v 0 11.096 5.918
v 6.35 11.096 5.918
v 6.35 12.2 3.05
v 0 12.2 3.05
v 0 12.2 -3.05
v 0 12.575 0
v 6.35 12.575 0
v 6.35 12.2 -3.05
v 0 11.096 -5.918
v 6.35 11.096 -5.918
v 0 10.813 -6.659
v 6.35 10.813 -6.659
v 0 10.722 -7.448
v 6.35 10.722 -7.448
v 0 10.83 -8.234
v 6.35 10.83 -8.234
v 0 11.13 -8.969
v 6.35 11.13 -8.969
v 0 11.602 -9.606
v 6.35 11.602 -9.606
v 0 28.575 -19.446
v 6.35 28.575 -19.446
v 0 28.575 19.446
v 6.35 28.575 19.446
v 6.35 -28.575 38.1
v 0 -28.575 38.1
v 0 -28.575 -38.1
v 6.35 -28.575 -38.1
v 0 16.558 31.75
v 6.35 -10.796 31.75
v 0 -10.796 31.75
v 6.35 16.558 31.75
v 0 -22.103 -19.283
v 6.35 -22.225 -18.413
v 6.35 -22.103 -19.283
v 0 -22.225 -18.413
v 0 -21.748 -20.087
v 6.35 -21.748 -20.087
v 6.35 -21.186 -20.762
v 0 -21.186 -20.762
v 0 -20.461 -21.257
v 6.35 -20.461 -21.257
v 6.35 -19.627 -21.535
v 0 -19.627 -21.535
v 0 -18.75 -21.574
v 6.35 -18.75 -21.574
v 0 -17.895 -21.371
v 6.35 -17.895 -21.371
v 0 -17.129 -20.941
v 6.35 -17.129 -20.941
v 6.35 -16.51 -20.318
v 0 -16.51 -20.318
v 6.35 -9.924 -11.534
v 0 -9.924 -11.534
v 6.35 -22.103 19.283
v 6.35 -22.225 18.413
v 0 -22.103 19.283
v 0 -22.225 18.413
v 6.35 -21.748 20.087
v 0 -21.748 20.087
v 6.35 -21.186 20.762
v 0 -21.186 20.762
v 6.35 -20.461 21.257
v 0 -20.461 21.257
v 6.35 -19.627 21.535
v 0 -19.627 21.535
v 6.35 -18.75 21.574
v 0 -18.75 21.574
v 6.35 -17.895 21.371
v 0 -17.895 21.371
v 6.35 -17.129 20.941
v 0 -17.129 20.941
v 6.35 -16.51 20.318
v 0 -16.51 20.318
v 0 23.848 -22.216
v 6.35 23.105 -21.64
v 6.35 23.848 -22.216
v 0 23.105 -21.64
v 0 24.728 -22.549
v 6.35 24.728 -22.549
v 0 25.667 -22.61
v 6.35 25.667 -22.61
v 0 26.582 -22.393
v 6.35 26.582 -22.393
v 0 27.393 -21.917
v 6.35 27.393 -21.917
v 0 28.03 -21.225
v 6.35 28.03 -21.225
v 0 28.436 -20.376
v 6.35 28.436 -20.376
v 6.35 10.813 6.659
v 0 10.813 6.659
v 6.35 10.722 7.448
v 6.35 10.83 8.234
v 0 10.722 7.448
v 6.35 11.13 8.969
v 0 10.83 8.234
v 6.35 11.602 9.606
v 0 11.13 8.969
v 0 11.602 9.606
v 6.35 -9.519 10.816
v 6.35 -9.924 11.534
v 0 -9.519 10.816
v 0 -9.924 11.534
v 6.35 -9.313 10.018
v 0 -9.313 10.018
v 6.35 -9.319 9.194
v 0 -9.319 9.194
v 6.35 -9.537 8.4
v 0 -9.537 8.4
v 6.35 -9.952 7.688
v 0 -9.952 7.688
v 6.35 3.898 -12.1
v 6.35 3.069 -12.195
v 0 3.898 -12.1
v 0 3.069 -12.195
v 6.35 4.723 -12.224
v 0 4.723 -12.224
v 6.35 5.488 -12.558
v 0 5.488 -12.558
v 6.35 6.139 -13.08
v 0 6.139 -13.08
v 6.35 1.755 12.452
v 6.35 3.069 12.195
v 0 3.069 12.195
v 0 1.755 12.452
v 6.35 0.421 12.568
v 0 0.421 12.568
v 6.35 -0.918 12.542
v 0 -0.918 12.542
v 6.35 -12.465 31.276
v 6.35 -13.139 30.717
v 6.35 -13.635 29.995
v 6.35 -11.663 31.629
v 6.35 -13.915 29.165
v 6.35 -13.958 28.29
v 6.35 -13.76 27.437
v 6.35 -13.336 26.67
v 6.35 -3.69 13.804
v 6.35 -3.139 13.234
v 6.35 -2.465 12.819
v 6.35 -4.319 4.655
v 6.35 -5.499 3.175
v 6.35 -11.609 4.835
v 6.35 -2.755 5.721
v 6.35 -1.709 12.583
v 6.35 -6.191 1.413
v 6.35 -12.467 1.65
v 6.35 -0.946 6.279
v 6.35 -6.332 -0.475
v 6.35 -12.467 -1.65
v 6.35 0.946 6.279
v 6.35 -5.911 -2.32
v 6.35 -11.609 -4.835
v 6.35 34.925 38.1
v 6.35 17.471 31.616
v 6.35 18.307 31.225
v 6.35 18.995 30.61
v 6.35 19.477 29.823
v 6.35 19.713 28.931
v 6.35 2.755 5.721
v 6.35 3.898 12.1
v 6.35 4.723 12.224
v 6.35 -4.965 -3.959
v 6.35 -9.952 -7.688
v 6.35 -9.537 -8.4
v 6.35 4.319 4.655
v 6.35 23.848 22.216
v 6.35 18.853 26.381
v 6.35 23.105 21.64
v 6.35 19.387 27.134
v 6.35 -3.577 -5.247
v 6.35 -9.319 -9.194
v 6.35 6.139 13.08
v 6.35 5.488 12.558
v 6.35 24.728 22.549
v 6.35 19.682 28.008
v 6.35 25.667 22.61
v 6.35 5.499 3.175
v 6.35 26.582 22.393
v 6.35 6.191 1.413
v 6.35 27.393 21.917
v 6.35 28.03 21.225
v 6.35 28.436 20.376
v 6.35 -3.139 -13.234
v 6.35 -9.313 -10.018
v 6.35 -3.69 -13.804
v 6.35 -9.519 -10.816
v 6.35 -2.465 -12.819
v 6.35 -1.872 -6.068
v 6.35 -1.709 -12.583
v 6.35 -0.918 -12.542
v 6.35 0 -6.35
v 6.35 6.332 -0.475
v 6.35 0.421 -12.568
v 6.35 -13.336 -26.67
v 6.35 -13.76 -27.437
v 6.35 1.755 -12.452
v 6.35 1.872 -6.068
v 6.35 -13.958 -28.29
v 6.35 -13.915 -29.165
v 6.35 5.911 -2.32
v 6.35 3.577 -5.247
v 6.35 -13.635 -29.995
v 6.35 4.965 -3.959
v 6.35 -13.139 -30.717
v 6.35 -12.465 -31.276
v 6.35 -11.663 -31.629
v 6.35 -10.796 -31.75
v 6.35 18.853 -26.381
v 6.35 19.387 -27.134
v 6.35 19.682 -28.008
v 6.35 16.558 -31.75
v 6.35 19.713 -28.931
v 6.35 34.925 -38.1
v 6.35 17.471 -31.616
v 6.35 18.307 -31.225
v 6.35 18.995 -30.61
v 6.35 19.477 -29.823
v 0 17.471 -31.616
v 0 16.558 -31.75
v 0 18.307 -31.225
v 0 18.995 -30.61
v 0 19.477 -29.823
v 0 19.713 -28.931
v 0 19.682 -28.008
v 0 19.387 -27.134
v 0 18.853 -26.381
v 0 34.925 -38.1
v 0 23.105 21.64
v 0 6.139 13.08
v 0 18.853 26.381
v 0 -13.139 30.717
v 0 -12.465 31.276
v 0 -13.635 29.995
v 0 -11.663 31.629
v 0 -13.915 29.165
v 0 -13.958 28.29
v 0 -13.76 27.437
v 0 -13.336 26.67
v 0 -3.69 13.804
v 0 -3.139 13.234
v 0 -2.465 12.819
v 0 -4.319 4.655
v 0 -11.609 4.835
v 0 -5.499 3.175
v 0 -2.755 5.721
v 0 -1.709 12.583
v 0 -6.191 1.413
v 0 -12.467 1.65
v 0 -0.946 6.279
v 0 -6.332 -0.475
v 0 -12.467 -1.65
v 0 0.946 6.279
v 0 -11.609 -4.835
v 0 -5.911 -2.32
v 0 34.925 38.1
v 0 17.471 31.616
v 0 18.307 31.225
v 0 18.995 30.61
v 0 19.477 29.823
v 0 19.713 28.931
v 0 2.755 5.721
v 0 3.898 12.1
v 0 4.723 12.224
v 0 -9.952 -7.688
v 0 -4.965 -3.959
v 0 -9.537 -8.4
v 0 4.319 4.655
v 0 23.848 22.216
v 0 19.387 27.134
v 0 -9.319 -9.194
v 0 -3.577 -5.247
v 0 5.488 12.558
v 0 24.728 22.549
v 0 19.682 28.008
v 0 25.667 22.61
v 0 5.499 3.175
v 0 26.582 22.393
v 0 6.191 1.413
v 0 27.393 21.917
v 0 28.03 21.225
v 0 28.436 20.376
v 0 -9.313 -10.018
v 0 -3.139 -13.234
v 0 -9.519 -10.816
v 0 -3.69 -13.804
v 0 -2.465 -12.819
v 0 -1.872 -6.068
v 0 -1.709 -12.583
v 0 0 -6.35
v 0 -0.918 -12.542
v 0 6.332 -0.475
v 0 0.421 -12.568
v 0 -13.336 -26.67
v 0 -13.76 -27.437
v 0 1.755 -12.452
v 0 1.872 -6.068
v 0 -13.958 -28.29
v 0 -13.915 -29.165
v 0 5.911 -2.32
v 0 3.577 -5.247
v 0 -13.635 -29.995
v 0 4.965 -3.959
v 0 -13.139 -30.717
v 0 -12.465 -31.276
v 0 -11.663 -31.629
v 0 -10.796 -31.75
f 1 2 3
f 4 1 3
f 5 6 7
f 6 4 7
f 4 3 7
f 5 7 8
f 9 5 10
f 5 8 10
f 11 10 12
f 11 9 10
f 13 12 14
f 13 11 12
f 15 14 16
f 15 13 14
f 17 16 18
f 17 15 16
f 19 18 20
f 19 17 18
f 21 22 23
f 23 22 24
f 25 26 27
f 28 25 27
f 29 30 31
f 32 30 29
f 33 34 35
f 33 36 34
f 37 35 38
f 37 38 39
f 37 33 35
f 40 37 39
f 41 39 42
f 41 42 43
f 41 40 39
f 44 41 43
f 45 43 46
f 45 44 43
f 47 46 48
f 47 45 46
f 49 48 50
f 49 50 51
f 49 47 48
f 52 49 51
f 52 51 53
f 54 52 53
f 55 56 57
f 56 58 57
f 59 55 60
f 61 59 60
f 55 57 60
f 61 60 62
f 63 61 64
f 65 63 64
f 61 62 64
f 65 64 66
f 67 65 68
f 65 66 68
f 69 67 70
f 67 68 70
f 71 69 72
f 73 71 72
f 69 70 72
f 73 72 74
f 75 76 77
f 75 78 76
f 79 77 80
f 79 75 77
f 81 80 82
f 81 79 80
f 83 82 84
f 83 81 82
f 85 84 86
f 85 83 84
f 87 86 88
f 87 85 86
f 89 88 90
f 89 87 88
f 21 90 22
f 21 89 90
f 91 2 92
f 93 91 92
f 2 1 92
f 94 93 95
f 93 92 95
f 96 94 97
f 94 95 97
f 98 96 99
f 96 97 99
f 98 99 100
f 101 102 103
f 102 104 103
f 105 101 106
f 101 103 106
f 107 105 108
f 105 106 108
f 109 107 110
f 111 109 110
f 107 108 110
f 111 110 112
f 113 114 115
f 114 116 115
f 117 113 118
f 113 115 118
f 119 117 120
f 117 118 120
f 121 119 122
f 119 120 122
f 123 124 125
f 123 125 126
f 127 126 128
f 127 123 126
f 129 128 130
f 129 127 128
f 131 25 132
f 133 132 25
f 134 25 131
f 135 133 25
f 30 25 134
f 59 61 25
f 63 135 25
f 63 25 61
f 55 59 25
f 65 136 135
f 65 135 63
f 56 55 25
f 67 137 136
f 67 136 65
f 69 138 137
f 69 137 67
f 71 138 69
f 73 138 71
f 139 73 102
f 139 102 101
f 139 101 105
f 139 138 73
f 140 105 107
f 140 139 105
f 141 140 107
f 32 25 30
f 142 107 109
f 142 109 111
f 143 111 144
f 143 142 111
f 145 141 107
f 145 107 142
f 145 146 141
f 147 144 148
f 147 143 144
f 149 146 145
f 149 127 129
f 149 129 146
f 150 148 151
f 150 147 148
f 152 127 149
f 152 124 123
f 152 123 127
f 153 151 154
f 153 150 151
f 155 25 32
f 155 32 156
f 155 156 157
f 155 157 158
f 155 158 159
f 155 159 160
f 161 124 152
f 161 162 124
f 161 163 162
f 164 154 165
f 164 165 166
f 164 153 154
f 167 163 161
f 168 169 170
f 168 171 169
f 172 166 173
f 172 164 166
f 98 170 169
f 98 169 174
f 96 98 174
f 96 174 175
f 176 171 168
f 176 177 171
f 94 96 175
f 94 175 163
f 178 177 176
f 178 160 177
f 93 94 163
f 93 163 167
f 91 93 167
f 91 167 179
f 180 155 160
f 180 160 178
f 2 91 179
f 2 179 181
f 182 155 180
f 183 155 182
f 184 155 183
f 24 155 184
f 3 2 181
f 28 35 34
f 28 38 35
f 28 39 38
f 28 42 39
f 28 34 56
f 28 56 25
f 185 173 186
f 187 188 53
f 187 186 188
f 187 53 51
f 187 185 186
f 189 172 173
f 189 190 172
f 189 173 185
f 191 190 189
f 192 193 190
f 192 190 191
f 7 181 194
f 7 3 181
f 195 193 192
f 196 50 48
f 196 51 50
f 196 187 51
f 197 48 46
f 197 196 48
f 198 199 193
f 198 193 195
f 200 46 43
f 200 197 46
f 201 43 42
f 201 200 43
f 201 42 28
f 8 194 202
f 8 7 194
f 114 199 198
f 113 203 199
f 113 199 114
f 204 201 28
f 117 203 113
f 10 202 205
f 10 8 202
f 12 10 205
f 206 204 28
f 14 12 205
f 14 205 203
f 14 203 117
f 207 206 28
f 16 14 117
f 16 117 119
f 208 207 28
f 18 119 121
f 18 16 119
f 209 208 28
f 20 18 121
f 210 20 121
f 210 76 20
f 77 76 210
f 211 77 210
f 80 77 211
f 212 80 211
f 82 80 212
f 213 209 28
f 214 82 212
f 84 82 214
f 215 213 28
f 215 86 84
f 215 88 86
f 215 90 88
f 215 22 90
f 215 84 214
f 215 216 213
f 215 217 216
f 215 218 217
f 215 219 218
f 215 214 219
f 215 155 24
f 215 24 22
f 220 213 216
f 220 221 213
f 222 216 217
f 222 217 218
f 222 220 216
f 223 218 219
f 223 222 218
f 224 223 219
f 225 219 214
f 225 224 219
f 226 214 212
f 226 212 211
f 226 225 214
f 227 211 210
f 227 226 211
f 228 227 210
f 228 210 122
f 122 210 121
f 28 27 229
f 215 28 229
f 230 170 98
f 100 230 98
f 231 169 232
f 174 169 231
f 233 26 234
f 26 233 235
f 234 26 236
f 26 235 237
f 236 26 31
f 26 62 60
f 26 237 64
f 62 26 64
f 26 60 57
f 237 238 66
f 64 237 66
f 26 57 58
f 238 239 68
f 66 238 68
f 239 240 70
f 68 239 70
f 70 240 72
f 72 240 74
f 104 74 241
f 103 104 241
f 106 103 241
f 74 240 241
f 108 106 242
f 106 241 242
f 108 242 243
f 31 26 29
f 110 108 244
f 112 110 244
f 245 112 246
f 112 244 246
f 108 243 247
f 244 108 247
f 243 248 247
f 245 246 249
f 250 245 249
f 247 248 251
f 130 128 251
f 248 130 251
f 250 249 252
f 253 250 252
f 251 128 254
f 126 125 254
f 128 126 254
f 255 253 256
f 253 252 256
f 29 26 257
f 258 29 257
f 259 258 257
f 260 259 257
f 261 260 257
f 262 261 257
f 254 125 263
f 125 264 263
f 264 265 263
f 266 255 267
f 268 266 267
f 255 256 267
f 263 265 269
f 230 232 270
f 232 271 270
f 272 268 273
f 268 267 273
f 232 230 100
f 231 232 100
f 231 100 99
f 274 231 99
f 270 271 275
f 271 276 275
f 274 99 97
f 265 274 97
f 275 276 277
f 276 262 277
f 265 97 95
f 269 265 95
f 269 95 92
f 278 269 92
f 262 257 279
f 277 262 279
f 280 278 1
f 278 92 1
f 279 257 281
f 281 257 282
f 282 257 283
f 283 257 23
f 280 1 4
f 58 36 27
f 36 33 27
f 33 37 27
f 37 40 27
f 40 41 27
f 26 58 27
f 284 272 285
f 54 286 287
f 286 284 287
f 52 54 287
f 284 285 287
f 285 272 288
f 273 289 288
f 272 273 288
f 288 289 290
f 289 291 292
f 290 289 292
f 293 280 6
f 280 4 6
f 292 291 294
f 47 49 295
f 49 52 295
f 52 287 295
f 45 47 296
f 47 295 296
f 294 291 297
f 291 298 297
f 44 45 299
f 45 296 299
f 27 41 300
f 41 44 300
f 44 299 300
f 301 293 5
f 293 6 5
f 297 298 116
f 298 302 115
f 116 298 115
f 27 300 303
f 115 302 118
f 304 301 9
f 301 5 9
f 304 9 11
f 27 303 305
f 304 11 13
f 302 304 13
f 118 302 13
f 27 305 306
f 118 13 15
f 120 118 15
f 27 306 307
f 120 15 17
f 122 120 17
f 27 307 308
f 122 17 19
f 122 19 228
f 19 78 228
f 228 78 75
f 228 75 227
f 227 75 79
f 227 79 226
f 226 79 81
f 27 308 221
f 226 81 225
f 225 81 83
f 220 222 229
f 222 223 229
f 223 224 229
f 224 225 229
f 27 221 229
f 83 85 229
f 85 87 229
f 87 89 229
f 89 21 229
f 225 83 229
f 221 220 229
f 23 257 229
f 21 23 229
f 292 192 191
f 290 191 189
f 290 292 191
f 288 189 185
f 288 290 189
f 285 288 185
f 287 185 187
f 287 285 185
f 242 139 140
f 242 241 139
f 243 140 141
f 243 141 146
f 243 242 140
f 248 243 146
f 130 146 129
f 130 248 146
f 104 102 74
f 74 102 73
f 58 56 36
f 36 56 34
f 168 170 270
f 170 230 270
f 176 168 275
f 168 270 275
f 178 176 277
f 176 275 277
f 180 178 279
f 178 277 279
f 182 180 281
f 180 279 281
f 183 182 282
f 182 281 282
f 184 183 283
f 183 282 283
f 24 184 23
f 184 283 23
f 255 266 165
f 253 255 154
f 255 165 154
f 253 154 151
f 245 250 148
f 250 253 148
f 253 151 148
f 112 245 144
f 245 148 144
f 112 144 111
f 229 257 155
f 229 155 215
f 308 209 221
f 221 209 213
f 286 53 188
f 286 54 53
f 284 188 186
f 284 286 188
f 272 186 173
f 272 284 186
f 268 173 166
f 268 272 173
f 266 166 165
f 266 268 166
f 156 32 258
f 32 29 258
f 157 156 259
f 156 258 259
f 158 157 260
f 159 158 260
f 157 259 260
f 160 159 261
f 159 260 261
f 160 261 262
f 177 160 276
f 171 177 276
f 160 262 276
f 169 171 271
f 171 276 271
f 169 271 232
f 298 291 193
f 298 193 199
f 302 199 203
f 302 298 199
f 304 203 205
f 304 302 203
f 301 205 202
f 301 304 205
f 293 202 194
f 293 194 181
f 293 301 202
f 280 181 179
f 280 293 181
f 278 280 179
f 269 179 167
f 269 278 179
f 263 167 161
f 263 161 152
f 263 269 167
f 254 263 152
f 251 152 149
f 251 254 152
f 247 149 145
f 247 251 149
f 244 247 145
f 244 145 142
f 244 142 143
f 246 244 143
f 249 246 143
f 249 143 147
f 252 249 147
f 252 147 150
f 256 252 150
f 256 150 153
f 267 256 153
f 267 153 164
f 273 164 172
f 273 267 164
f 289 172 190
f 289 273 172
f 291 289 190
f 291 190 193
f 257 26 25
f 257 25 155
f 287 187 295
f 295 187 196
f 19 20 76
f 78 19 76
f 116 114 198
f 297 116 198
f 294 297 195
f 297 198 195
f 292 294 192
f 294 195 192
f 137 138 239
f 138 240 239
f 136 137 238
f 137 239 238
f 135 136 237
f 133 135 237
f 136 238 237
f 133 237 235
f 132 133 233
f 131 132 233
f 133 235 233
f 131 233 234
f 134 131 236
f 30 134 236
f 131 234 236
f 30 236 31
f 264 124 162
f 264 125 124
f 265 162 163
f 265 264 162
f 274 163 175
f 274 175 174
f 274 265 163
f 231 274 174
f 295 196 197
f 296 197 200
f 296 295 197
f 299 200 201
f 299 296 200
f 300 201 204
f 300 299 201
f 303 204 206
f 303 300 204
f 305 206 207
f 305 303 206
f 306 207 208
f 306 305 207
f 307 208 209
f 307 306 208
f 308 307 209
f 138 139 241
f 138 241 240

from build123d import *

# Parameters (mm, degrees)
SKETCH1_W           = 76.2
SKETCH1_H           = 63.5
SKETCH1_R           = 6.35
BOSS_EXTRUDE1_DEPTH = 6.35
CUT_EXTRUDE1_REACH  = 54.074
FILLET2_R           = 3.175


with BuildPart() as part:
    # Sketch1 → Boss-Extrude1 (new body)
    with BuildSketch(Plane(origin=(0, 0, 0), x_dir=(0, 0, -1), z_dir=(1, 0, 0))):
        with Locations((0, 3.175)):
            Rectangle(SKETCH1_W, SKETCH1_H)
        Circle(SKETCH1_R, mode=Mode.SUBTRACT)
    extrude(amount=BOSS_EXTRUDE1_DEPTH)

    # Sketch4 → Cut-Extrude1 (cut, up to next)
    with BuildSketch(Plane(origin=(6.35, 0, 0), x_dir=(0, 0, -1), z_dir=(1, 0, 0)), mode=Mode.PRIVATE) as cut_extrude1_sk1:
        with BuildLine():
            Line((-9.415500655, -8.336066847), (-27.940897809, -22.225))
            Line((-27.940897809, -22.225), (27.940897809, -22.225))
            Line((27.940897809, -22.225), (9.415500655, -8.336066847))
            ThreePointArc((9.415500655, -8.336066847), (0, -12.575438882), (-9.415500655, -8.336066847))
        make_face()
    cut_extrude1_tool1 = extrude(cut_extrude1_sk1.sketch, amount=-CUT_EXTRUDE1_REACH, mode=Mode.PRIVATE) & part.part
    # Sketch4 → Cut-Extrude1 (cut, up to next)
    with BuildSketch(Plane(origin=(6.35, 0, 0), x_dir=(0, 0, -1), z_dir=(1, 0, 0)), mode=Mode.PRIVATE) as cut_extrude1_sk2:
        with BuildLine():
            Line((-12.310078524, -2.569752866), (-31.75, -17.144326768))
            Line((-31.75, -17.144326768), (-31.75, 23.984763034))
            Line((-31.75, 23.984763034), (-11.639261898, 4.761223113))
            ThreePointArc((-11.639261898, 4.761223113), (-12.523119774, 1.145920677), (-12.310078524, -2.569752866))
        make_face()
    cut_extrude1_tool2 = extrude(cut_extrude1_sk2.sketch, amount=-CUT_EXTRUDE1_REACH, mode=Mode.PRIVATE) & part.part
    # Sketch4 → Cut-Extrude1 (cut, up to next)
    with BuildSketch(Plane(origin=(6.35, 0, 0), x_dir=(0, 0, -1), z_dir=(1, 0, 0)), mode=Mode.PRIVATE) as cut_extrude1_sk3:
        with BuildLine():
            Line((-27.362264298, 28.575), (-7.793369677, 9.869399786))
            ThreePointArc((-7.793369677, 9.869399786), (0, 12.575438882), (7.793369677, 9.869399786))
            Line((7.793369677, 9.869399786), (27.362264298, 28.575))
            Line((27.362264298, 28.575), (-27.362264298, 28.575))
        make_face()
    cut_extrude1_tool3 = extrude(cut_extrude1_sk3.sketch, amount=-CUT_EXTRUDE1_REACH, mode=Mode.PRIVATE) & part.part
    # Sketch4 → Cut-Extrude1 (cut, up to next)
    with BuildSketch(Plane(origin=(6.35, 0, 0), x_dir=(0, 0, -1), z_dir=(1, 0, 0)), mode=Mode.PRIVATE) as cut_extrude1_sk4:
        with BuildLine():
            Line((31.75, 23.984763034), (11.639261898, 4.761223113))
            ThreePointArc((11.639261898, 4.761223113), (12.523119774, 1.145920677), (12.310078524, -2.569752866))
            Line((12.310078524, -2.569752866), (31.75, -17.144326768))
            Line((31.75, -17.144326768), (31.75, 23.984763034))
        make_face()
    cut_extrude1_tool4 = extrude(cut_extrude1_sk4.sketch, amount=-CUT_EXTRUDE1_REACH, mode=Mode.PRIVATE) & part.part
    add(cut_extrude1_tool1.solids().sort_by_distance((6.35, -17.188664, 0))[0], mode=Mode.SUBTRACT)
    add(cut_extrude1_tool2.solids().sort_by_distance((6.35, 2.651872, 24.218351))[0], mode=Mode.SUBTRACT)
    add(cut_extrude1_tool3.solids().sort_by_distance((6.35, 21.415116, 0))[0], mode=Mode.SUBTRACT)
    add(cut_extrude1_tool4.solids().sort_by_distance((6.35, 2.651872, -24.218351))[0], mode=Mode.SUBTRACT)

    # Fillet2
    fillet2_edges = [part.edges().sort_by_distance(p)[0] for p in [
        (3.175, 4.761223113, 11.639261898),
        (3.175, -2.569752866, 12.310078524),
        (3.175, -17.144326768, 31.75),
        (3.175, 23.984763034, 31.75),
        (3.175, -8.336066847, 9.415500655),
        (3.175, -8.336066847, -9.415500655),
        (3.175, -22.225, -27.940897809),
        (3.175, -22.225, 27.940897809),
        (3.175, 28.575, 27.362264298),
        (3.175, 28.575, -27.362264298),
        (3.175, 9.869399786, -7.793369677),
        (3.175, 9.869399786, 7.793369677),
        (3.175, 23.984763034, -31.75),
        (3.175, -17.144326768, -31.75),
        (3.175, -2.569752866, -12.310078524),
        (3.175, 4.761223113, -11.639261898),
    ]]
    fillet(fillet2_edges, radius=FILLET2_R)


solid = part.part
